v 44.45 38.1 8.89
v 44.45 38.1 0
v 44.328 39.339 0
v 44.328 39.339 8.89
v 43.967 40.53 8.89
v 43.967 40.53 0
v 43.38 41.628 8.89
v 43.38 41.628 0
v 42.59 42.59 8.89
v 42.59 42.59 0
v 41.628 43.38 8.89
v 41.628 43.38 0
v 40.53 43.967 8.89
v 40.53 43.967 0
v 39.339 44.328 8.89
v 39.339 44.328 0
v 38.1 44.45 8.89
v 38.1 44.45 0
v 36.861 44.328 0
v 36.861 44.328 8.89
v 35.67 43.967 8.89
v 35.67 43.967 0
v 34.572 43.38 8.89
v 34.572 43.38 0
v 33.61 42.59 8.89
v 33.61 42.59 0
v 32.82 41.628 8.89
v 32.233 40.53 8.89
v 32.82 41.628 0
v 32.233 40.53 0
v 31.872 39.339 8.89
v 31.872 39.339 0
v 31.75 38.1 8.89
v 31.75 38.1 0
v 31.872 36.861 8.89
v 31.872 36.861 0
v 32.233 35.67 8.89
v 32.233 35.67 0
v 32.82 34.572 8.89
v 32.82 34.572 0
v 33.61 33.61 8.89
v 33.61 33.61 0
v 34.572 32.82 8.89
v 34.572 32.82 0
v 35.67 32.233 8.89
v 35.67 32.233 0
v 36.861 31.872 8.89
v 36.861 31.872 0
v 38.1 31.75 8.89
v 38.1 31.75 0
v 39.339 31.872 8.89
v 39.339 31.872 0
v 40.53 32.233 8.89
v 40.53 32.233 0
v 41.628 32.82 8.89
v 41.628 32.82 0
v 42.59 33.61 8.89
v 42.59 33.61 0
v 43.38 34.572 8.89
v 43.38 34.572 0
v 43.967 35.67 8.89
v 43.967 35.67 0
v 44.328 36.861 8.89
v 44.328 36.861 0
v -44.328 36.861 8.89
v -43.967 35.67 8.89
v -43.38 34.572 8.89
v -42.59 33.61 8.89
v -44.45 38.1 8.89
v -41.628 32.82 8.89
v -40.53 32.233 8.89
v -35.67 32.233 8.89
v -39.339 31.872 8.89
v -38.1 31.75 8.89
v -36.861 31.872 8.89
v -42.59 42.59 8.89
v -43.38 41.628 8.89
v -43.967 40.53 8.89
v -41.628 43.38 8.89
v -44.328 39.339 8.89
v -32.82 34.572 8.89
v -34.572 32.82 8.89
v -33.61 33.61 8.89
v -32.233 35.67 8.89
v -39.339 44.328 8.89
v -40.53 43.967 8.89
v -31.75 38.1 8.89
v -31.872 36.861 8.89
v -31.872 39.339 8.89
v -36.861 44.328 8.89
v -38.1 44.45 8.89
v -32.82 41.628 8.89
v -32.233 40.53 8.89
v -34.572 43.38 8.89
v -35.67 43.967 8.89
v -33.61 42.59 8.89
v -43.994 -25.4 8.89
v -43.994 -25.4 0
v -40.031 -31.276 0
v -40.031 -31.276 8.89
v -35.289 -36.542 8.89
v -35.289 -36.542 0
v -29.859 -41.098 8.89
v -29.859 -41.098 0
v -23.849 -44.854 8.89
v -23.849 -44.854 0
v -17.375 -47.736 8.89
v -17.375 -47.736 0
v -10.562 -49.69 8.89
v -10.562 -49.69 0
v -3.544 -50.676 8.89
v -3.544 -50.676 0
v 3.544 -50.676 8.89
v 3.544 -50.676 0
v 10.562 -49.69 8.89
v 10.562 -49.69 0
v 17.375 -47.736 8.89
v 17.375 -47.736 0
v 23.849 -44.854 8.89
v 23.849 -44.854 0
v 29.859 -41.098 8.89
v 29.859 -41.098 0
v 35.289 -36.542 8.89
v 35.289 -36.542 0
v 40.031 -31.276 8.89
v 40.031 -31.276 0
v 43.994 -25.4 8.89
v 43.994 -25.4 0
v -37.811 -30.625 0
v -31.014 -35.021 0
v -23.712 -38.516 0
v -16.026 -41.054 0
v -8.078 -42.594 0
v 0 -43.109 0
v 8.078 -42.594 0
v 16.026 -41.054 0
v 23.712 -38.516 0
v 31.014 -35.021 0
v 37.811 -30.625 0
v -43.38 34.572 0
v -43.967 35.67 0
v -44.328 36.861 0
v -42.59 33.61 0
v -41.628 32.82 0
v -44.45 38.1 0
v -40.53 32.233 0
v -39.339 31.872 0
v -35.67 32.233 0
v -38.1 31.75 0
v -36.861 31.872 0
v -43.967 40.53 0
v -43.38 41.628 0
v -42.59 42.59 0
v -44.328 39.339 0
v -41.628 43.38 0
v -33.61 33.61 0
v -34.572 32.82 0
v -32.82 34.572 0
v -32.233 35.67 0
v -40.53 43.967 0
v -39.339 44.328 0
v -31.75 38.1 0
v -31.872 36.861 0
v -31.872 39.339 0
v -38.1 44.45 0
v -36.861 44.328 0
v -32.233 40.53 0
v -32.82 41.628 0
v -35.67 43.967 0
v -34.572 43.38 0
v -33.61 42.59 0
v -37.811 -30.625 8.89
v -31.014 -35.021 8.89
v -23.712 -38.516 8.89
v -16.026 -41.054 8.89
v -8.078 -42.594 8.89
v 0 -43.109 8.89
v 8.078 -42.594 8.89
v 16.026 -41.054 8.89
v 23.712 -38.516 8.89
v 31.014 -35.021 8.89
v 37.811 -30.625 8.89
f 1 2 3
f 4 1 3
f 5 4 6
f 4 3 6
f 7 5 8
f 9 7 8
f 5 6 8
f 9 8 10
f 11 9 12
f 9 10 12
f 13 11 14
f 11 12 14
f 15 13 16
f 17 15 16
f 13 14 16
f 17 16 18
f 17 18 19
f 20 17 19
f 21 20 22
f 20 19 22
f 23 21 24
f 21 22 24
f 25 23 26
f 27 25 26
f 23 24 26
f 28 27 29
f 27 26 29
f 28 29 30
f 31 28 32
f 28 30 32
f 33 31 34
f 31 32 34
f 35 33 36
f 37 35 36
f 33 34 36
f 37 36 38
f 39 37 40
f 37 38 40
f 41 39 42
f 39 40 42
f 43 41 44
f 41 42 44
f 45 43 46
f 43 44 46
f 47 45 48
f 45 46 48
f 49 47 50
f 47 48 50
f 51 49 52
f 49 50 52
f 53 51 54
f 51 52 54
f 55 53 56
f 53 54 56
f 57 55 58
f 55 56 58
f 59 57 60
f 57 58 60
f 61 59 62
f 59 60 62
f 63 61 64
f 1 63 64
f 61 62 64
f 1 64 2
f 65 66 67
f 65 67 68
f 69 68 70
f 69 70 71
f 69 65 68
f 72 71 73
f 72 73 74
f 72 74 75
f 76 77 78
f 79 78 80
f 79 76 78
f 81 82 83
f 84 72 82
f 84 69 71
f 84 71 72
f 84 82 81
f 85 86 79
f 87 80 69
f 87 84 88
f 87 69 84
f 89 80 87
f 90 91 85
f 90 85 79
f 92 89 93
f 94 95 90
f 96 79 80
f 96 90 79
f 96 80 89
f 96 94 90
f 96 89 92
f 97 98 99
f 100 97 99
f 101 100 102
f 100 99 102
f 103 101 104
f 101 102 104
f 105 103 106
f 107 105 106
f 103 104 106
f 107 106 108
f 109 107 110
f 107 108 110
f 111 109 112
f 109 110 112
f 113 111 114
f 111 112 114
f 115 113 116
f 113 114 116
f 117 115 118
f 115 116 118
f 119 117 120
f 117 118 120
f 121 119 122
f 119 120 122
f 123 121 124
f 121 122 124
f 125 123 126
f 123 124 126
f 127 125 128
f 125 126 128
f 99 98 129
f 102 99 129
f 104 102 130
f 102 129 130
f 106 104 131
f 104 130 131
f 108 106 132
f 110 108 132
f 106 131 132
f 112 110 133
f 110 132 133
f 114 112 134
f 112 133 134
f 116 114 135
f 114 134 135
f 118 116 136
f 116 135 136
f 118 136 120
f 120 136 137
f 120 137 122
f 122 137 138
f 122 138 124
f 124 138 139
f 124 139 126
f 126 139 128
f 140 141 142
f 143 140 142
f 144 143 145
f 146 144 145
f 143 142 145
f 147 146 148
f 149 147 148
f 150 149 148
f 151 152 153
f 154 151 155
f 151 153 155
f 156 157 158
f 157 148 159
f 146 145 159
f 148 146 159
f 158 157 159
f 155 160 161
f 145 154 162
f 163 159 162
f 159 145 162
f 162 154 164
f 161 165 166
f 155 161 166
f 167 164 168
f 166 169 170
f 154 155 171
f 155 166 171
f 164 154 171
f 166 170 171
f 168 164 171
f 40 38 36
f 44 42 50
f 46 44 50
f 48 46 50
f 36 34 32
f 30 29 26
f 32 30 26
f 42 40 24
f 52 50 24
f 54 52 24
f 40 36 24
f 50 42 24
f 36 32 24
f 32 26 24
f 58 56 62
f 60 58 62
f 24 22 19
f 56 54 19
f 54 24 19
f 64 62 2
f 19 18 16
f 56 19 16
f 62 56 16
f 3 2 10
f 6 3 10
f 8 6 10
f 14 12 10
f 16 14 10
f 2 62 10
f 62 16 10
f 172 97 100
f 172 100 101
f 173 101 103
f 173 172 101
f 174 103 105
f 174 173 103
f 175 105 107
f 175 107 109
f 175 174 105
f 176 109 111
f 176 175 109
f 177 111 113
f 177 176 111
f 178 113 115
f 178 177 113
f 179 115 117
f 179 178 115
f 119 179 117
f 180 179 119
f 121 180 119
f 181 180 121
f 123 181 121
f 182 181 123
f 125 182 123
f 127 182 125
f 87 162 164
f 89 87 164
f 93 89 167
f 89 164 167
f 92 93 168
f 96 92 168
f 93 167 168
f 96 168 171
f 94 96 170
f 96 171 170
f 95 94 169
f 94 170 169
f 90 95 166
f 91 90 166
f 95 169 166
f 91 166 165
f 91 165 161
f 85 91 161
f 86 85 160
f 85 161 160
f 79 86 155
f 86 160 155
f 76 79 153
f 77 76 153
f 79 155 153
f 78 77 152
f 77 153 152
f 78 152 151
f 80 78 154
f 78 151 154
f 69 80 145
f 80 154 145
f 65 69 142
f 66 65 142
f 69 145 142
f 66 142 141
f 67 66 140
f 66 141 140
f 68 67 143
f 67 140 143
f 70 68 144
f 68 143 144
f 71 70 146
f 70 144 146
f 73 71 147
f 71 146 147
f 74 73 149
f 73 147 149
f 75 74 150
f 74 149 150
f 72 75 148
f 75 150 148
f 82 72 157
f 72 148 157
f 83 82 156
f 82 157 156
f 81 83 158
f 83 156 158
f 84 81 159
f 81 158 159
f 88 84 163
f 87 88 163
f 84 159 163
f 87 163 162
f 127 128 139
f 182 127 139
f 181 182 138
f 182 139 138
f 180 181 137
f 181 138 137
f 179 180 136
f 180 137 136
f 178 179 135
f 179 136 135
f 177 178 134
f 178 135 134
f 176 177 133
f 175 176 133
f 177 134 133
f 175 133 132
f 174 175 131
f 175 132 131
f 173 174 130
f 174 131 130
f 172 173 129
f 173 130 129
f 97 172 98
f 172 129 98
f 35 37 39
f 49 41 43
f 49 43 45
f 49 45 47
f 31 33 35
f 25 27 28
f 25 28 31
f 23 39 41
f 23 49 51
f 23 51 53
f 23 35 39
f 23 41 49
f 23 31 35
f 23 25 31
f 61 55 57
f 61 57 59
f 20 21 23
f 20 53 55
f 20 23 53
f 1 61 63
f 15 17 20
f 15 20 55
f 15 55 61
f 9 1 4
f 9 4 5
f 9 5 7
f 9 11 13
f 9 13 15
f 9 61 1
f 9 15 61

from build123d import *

# Parameters (mm, degrees)
F0_R     = 6.35
F1_DEPTH = 8.89


with BuildPart() as f1:
    # F0 (on Top) → F1 (new body)
    with BuildSketch(Plane.XY):
        with Locations((-38.1, 38.1)):
            Circle(F0_R)
        with Locations((38.1, 38.1)):
            Circle(F0_R)
        with BuildLine():
            ThreePointArc((43.994091, -25.4), (0, -43.109499), (-43.994091, -25.4))
            ThreePointArc((-43.994091, -25.4), (0, -50.8), (43.994091, -25.4))
        make_face()
    extrude(amount=F1_DEPTH)


solid = f1.part
